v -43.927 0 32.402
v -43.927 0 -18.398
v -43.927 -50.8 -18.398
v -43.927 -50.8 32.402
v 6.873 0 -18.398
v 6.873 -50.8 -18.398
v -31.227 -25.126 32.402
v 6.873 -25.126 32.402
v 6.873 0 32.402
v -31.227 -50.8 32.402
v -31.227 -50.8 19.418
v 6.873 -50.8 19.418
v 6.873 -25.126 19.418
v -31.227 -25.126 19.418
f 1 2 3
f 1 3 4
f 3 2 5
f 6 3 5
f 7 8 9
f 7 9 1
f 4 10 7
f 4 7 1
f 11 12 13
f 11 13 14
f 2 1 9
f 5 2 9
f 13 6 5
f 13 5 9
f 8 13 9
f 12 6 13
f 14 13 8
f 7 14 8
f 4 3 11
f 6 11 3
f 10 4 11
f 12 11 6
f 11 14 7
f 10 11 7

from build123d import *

# Parameters (mm, degrees)
F0_W     = 50.8
F0_H     = 50.8
F1_DEPTH = 50.8
F3_DEPTH = 38.1
F4_W     = 12.973598972
F4_H     = 12.9839326696
F5_DEPTH = 38.1
F6_DEPTH = 12.7
F7_DEPTH = 12.7


with BuildPart() as f1:
    # F0 (on Front) → F1 (new body)
    with BuildSketch(Plane.XZ):
        with Locations((-18.5270585775, 7.0019777209)):
            Rectangle(F0_W, F0_H)
    extrude(amount=F1_DEPTH)

    # F2 (on face) → F3 (cut)
    with BuildSketch(Plane.XZ.offset(50.8)):
        Polygon((6.8729414225, 32.4019777209), (6.8729414225, 17.4989413492), (25.4, 17.4989413492), (25.4, 42.8989413492), (0, 42.8989413492), (0, 32.4019777209), align=None)
    extrude(amount=-F3_DEPTH, mode=Mode.SUBTRACT)

    # F4 (on face) → F5 (cut)
    with BuildSketch(Plane.YZ.offset(6.8729414225)):
        with Locations((-44.313200514, 25.910011386)):
            Rectangle(F4_W, F4_H)
    extrude(amount=-F5_DEPTH, mode=Mode.SUBTRACT)

    # F6 (add): a face of the model
    f6_faces = [f1.faces().sort_by_distance(p)[0] for p in [
        (-12.1770585775, -37.826401028, 25.910011386),
    ]]
    extrude(f6_faces, amount=-F6_DEPTH)

    # F7 (cut): a face of the model
    f7_faces = [f1.faces().sort_by_distance(p)[0] for p in [
        (-12.1770585775, -37.826401028, 25.910011386),
    ]]
    extrude(f7_faces, amount=-F7_DEPTH, mode=Mode.SUBTRACT)


solid = f1.part
